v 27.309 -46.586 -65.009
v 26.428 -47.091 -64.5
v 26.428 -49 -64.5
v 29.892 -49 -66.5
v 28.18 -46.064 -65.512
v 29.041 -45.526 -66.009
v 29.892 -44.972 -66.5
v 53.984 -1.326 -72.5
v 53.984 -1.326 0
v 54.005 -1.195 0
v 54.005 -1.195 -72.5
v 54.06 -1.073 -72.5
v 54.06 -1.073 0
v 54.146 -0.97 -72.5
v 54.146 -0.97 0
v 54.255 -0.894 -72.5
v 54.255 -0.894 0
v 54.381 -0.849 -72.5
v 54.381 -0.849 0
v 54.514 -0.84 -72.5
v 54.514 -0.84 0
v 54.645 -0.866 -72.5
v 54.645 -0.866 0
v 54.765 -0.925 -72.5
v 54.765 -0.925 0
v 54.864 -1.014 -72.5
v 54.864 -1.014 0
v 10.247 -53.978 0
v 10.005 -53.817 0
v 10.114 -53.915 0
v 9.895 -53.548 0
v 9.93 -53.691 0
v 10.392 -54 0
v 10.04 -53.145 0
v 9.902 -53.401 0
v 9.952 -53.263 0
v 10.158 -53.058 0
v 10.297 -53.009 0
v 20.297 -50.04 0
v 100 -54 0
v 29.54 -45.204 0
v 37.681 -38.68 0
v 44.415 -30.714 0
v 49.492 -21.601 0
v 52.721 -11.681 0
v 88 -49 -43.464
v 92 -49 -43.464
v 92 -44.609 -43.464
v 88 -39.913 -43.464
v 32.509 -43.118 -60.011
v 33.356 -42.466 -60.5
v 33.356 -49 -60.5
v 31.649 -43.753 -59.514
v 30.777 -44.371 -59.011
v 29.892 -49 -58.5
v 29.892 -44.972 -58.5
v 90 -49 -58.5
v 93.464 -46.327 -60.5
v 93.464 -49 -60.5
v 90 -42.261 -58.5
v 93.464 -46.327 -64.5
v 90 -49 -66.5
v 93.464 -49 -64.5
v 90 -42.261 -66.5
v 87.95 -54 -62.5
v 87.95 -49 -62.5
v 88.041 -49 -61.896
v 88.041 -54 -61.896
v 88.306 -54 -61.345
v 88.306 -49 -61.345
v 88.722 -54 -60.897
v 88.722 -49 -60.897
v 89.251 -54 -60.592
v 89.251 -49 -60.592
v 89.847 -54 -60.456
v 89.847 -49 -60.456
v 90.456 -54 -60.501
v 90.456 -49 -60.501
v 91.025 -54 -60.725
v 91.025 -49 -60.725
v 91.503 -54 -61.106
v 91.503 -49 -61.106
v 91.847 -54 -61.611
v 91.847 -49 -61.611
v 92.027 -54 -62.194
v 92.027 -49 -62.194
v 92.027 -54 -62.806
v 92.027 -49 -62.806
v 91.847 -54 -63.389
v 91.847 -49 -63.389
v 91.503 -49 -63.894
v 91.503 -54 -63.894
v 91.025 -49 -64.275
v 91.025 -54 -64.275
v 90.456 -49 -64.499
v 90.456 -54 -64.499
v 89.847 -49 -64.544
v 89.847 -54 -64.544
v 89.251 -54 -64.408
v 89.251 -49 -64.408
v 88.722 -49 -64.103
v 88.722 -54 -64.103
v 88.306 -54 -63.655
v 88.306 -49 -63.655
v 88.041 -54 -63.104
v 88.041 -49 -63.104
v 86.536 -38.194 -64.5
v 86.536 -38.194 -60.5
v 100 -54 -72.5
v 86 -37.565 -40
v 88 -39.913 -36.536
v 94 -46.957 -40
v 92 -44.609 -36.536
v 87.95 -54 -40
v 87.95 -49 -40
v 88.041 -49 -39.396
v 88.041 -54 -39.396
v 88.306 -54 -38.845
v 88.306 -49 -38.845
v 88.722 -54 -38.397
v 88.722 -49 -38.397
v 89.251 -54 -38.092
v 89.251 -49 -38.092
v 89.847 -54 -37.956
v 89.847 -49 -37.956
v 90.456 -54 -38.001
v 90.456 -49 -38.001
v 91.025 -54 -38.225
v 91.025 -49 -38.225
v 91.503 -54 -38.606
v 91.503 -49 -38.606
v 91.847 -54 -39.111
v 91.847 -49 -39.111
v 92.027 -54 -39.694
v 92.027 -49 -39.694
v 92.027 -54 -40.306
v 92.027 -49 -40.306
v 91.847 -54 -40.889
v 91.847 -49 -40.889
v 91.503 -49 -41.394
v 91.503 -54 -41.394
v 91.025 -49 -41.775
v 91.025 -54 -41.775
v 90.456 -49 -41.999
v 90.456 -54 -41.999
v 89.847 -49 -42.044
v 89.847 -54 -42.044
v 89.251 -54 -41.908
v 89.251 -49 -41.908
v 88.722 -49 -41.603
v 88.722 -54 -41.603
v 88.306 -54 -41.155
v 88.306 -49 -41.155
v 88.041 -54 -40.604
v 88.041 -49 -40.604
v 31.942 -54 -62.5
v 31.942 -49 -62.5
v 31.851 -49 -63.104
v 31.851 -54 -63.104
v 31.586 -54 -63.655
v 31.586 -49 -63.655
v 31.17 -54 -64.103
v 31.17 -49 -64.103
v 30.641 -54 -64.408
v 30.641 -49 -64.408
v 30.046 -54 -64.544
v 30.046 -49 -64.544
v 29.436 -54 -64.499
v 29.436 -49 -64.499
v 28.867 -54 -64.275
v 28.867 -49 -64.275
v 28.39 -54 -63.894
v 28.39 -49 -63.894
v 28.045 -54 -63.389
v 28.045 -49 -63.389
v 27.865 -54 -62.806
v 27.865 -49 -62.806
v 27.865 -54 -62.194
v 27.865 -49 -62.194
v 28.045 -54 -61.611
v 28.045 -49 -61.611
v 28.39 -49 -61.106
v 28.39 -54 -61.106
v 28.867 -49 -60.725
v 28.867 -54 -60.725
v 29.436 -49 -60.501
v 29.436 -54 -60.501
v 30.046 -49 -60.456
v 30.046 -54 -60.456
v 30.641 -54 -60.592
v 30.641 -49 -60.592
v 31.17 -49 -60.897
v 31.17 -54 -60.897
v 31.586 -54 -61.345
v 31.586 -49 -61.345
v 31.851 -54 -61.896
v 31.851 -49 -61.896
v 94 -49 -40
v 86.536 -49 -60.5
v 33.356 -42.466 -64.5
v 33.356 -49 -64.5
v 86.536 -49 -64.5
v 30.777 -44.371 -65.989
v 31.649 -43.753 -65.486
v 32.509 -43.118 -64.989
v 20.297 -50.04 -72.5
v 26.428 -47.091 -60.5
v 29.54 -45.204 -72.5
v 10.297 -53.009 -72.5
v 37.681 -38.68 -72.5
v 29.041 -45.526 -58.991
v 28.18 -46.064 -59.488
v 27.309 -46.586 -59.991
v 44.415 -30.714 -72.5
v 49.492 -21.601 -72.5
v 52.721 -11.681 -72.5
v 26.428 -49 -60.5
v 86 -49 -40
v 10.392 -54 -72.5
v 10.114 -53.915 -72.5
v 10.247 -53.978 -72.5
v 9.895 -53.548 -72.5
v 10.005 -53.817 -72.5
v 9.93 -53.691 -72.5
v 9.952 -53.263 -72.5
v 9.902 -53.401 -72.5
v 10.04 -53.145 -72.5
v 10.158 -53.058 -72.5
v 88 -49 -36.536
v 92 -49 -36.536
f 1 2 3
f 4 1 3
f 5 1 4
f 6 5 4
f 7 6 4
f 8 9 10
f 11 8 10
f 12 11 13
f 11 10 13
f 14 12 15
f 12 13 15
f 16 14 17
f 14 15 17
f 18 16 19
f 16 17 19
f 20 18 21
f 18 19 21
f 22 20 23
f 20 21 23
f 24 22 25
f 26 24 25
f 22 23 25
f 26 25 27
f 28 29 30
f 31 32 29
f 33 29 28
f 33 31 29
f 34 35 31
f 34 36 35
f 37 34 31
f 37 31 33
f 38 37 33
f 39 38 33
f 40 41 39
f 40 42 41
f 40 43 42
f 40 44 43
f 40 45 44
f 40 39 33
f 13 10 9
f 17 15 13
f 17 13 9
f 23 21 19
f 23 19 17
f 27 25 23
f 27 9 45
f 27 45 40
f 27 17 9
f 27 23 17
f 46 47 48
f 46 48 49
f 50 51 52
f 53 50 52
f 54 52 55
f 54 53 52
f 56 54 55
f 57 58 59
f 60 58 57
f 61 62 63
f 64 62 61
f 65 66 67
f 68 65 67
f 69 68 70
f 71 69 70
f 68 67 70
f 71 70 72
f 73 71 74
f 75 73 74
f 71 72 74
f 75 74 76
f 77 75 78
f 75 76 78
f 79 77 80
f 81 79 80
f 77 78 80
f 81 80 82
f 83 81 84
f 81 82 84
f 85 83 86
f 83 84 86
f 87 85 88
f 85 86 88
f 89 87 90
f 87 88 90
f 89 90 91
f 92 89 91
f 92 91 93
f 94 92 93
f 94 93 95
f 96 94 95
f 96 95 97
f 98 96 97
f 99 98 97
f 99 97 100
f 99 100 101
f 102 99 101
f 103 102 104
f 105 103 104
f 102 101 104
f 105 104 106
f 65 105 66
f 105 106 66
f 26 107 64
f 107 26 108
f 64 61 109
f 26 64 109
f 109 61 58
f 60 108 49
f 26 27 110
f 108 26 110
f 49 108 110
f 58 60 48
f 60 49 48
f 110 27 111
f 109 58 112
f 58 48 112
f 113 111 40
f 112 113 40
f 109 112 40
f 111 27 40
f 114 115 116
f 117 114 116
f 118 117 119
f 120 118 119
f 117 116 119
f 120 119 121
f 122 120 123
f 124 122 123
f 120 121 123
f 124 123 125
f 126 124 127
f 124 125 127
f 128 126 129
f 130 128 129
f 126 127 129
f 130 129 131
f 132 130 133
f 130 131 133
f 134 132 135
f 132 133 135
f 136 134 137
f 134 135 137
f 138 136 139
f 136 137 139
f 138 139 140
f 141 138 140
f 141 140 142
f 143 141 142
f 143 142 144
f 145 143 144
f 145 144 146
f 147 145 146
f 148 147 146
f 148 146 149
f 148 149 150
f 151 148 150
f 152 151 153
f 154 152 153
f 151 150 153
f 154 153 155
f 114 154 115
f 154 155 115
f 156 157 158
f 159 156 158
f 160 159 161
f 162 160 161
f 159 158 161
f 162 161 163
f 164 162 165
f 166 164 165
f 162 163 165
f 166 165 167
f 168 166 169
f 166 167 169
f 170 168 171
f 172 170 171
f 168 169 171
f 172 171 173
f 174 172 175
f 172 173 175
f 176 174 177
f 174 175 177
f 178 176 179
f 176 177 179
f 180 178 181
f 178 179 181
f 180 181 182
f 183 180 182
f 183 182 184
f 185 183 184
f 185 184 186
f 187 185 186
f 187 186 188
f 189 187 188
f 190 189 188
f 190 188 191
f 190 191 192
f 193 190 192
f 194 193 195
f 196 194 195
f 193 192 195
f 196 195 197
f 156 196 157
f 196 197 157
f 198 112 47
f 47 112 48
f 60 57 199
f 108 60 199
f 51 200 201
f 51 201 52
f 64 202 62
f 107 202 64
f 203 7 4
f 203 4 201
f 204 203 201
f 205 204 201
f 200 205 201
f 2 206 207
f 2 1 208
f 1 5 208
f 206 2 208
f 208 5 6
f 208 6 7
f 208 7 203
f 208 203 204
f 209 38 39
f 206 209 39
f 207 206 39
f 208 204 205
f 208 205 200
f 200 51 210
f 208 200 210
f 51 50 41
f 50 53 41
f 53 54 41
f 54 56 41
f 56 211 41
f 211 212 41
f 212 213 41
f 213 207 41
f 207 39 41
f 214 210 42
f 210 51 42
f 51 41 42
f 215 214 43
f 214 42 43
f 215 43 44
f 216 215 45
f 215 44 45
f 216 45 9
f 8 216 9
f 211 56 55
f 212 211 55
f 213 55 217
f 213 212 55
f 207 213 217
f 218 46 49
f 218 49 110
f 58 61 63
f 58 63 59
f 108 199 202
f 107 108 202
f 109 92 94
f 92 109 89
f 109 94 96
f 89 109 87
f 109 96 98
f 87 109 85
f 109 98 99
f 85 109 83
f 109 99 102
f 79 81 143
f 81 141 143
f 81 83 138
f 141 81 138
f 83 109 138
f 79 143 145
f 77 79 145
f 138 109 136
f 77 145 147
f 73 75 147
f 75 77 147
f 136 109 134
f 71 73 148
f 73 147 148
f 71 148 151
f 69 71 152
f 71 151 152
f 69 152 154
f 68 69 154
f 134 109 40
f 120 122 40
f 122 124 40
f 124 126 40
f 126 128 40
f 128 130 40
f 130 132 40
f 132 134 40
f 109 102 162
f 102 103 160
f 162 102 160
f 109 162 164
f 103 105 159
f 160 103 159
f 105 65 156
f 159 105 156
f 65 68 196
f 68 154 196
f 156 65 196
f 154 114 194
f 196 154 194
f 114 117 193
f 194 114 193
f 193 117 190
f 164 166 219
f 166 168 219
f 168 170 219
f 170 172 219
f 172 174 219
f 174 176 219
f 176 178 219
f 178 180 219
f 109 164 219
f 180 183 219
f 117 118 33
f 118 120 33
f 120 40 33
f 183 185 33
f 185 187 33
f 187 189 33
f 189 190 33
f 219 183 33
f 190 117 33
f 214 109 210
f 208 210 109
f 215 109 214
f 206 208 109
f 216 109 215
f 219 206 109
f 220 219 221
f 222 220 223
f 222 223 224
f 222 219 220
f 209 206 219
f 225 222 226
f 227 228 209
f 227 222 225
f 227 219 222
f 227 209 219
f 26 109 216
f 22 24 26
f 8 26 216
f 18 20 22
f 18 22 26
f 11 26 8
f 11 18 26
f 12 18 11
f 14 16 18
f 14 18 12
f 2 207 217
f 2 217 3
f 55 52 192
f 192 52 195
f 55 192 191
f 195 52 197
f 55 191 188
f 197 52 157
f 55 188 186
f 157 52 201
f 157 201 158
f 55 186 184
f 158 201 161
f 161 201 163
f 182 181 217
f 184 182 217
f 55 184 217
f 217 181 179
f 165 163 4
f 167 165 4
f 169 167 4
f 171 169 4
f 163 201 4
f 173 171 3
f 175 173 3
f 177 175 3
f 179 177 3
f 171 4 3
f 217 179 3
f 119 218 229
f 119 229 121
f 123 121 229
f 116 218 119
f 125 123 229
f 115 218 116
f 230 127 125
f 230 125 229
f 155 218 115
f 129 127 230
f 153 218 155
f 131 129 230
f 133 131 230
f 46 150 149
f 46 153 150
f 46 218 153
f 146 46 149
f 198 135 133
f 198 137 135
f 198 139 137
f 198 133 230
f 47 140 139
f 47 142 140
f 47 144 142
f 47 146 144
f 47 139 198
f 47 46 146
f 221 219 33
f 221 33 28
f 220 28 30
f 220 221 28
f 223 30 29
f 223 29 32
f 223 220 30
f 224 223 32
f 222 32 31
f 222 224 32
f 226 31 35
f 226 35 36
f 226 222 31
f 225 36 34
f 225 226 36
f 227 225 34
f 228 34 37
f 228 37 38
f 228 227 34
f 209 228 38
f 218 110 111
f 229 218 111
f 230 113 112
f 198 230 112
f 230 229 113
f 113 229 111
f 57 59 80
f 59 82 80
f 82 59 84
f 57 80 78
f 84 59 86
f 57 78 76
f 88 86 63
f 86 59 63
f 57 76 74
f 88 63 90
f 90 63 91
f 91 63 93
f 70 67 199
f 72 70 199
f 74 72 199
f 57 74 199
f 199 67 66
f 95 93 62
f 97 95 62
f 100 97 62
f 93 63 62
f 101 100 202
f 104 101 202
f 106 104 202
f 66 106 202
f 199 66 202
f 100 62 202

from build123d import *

# Parameters (mm, degrees)
EXTRUDE_1_DEPTH     = 72.5
FILLET_1_R          = 0.5
CUT_EXTRUDE_1_DEPTH = 49
SKETCH_5_R          = 2.05
CUT_EXTRUDE_2_DEPTH = 5
SKETCH_6_R          = 74.194648386
CUT_EXTRUDE_3_DEPTH = 135.804488056


with BuildPart() as part:
    # 草图3 → 凸台-拉伸1 (new, symmetric)
    with BuildSketch(Plane.XY):
        with BuildLine():
            Line((100, -54), (0, -54))
            ThreePointArc((0, -54), (38.183766184, -38.183766184), (54, 0))
            Line((54, 0), (100, -54))
        make_face()
    extrude(amount=EXTRUDE_1_DEPTH, both=True)

    # 圆角1
    fillet_1_edges = [part.edges().sort_by_distance(p)[0] for p in [
        (54, 0, 0),
        (0, -54, 0),
    ]]
    fillet(fillet_1_edges, radius=FILLET_1_R)

    # 草图4 → 切除-拉伸1 (cut)
    with BuildSketch(Plane(origin=(0, 0, 0), x_dir=(1, 0, 0), z_dir=(0, 1, 0))):
        Polygon((93.464101615, -64.5), (93.464101615, -60.5), (90, -58.5), (86.535898385, -60.5), (86.535898385, -64.5), (90, -66.5), align=None)
        Polygon((29.892304845, -58.5), (26.42820323, -60.5), (26.42820323, -64.5), (29.892304845, -66.5), (33.356406461, -64.5), (33.356406461, -60.5), align=None)
        Polygon((33.356406461, 60.5), (29.892304845, 58.5), (26.42820323, 60.5), (26.42820323, 64.5), (29.892304845, 66.5), (33.356406461, 64.5), align=None)
        Polygon((90, 66.5), (93.464101615, 64.5), (93.464101615, 60.5), (90, 58.5), (86.535898385, 60.5), (86.535898385, 64.5), align=None)
        Polygon((92, -36.535898385), (88, -36.535898385), (86, -40), (88, -43.464101615), (92, -43.464101615), (94, -40), align=None)
        Polygon((94, 40), (92, 43.464101615), (88, 43.464101615), (86, 40), (88, 36.535898385), (92, 36.535898385), align=None)
    extrude(amount=-CUT_EXTRUDE_1_DEPTH, mode=Mode.SUBTRACT)

    # 草图5 → 切除-拉伸2 (cut)
    with BuildSketch(Plane(origin=(0, -49, 0), x_dir=(1, 0, 0), z_dir=(0, 1, 0))):
        with Locations(Location((29.892304845, -62.5, 0), (0, 0, 180))):
            Circle(SKETCH_5_R)
        with Locations((29.892304845, 62.5)):
            Circle(SKETCH_5_R)
        with Locations(Location((90, 62.5, 0), (0, 0, 180))):
            Circle(SKETCH_5_R)
        with Locations((90, -62.5)):
            Circle(SKETCH_5_R)
        with Locations(Location((90, 40, 0), (0, 0, 180))):
            Circle(SKETCH_5_R)
        with Locations(Location((90, -40.064560571, 0), (0, 0, 180))):
            Circle(SKETCH_5_R)
    extrude(amount=-CUT_EXTRUDE_2_DEPTH, mode=Mode.SUBTRACT)

    # 草图6 → 切除-拉伸3 (cut, through all)
    with BuildSketch(Plane.XY):
        with Locations((51.898746265, -54)):
            Circle(SKETCH_6_R)
    extrude(amount=CUT_EXTRUDE_3_DEPTH, mode=Mode.SUBTRACT)


solid = part.part
